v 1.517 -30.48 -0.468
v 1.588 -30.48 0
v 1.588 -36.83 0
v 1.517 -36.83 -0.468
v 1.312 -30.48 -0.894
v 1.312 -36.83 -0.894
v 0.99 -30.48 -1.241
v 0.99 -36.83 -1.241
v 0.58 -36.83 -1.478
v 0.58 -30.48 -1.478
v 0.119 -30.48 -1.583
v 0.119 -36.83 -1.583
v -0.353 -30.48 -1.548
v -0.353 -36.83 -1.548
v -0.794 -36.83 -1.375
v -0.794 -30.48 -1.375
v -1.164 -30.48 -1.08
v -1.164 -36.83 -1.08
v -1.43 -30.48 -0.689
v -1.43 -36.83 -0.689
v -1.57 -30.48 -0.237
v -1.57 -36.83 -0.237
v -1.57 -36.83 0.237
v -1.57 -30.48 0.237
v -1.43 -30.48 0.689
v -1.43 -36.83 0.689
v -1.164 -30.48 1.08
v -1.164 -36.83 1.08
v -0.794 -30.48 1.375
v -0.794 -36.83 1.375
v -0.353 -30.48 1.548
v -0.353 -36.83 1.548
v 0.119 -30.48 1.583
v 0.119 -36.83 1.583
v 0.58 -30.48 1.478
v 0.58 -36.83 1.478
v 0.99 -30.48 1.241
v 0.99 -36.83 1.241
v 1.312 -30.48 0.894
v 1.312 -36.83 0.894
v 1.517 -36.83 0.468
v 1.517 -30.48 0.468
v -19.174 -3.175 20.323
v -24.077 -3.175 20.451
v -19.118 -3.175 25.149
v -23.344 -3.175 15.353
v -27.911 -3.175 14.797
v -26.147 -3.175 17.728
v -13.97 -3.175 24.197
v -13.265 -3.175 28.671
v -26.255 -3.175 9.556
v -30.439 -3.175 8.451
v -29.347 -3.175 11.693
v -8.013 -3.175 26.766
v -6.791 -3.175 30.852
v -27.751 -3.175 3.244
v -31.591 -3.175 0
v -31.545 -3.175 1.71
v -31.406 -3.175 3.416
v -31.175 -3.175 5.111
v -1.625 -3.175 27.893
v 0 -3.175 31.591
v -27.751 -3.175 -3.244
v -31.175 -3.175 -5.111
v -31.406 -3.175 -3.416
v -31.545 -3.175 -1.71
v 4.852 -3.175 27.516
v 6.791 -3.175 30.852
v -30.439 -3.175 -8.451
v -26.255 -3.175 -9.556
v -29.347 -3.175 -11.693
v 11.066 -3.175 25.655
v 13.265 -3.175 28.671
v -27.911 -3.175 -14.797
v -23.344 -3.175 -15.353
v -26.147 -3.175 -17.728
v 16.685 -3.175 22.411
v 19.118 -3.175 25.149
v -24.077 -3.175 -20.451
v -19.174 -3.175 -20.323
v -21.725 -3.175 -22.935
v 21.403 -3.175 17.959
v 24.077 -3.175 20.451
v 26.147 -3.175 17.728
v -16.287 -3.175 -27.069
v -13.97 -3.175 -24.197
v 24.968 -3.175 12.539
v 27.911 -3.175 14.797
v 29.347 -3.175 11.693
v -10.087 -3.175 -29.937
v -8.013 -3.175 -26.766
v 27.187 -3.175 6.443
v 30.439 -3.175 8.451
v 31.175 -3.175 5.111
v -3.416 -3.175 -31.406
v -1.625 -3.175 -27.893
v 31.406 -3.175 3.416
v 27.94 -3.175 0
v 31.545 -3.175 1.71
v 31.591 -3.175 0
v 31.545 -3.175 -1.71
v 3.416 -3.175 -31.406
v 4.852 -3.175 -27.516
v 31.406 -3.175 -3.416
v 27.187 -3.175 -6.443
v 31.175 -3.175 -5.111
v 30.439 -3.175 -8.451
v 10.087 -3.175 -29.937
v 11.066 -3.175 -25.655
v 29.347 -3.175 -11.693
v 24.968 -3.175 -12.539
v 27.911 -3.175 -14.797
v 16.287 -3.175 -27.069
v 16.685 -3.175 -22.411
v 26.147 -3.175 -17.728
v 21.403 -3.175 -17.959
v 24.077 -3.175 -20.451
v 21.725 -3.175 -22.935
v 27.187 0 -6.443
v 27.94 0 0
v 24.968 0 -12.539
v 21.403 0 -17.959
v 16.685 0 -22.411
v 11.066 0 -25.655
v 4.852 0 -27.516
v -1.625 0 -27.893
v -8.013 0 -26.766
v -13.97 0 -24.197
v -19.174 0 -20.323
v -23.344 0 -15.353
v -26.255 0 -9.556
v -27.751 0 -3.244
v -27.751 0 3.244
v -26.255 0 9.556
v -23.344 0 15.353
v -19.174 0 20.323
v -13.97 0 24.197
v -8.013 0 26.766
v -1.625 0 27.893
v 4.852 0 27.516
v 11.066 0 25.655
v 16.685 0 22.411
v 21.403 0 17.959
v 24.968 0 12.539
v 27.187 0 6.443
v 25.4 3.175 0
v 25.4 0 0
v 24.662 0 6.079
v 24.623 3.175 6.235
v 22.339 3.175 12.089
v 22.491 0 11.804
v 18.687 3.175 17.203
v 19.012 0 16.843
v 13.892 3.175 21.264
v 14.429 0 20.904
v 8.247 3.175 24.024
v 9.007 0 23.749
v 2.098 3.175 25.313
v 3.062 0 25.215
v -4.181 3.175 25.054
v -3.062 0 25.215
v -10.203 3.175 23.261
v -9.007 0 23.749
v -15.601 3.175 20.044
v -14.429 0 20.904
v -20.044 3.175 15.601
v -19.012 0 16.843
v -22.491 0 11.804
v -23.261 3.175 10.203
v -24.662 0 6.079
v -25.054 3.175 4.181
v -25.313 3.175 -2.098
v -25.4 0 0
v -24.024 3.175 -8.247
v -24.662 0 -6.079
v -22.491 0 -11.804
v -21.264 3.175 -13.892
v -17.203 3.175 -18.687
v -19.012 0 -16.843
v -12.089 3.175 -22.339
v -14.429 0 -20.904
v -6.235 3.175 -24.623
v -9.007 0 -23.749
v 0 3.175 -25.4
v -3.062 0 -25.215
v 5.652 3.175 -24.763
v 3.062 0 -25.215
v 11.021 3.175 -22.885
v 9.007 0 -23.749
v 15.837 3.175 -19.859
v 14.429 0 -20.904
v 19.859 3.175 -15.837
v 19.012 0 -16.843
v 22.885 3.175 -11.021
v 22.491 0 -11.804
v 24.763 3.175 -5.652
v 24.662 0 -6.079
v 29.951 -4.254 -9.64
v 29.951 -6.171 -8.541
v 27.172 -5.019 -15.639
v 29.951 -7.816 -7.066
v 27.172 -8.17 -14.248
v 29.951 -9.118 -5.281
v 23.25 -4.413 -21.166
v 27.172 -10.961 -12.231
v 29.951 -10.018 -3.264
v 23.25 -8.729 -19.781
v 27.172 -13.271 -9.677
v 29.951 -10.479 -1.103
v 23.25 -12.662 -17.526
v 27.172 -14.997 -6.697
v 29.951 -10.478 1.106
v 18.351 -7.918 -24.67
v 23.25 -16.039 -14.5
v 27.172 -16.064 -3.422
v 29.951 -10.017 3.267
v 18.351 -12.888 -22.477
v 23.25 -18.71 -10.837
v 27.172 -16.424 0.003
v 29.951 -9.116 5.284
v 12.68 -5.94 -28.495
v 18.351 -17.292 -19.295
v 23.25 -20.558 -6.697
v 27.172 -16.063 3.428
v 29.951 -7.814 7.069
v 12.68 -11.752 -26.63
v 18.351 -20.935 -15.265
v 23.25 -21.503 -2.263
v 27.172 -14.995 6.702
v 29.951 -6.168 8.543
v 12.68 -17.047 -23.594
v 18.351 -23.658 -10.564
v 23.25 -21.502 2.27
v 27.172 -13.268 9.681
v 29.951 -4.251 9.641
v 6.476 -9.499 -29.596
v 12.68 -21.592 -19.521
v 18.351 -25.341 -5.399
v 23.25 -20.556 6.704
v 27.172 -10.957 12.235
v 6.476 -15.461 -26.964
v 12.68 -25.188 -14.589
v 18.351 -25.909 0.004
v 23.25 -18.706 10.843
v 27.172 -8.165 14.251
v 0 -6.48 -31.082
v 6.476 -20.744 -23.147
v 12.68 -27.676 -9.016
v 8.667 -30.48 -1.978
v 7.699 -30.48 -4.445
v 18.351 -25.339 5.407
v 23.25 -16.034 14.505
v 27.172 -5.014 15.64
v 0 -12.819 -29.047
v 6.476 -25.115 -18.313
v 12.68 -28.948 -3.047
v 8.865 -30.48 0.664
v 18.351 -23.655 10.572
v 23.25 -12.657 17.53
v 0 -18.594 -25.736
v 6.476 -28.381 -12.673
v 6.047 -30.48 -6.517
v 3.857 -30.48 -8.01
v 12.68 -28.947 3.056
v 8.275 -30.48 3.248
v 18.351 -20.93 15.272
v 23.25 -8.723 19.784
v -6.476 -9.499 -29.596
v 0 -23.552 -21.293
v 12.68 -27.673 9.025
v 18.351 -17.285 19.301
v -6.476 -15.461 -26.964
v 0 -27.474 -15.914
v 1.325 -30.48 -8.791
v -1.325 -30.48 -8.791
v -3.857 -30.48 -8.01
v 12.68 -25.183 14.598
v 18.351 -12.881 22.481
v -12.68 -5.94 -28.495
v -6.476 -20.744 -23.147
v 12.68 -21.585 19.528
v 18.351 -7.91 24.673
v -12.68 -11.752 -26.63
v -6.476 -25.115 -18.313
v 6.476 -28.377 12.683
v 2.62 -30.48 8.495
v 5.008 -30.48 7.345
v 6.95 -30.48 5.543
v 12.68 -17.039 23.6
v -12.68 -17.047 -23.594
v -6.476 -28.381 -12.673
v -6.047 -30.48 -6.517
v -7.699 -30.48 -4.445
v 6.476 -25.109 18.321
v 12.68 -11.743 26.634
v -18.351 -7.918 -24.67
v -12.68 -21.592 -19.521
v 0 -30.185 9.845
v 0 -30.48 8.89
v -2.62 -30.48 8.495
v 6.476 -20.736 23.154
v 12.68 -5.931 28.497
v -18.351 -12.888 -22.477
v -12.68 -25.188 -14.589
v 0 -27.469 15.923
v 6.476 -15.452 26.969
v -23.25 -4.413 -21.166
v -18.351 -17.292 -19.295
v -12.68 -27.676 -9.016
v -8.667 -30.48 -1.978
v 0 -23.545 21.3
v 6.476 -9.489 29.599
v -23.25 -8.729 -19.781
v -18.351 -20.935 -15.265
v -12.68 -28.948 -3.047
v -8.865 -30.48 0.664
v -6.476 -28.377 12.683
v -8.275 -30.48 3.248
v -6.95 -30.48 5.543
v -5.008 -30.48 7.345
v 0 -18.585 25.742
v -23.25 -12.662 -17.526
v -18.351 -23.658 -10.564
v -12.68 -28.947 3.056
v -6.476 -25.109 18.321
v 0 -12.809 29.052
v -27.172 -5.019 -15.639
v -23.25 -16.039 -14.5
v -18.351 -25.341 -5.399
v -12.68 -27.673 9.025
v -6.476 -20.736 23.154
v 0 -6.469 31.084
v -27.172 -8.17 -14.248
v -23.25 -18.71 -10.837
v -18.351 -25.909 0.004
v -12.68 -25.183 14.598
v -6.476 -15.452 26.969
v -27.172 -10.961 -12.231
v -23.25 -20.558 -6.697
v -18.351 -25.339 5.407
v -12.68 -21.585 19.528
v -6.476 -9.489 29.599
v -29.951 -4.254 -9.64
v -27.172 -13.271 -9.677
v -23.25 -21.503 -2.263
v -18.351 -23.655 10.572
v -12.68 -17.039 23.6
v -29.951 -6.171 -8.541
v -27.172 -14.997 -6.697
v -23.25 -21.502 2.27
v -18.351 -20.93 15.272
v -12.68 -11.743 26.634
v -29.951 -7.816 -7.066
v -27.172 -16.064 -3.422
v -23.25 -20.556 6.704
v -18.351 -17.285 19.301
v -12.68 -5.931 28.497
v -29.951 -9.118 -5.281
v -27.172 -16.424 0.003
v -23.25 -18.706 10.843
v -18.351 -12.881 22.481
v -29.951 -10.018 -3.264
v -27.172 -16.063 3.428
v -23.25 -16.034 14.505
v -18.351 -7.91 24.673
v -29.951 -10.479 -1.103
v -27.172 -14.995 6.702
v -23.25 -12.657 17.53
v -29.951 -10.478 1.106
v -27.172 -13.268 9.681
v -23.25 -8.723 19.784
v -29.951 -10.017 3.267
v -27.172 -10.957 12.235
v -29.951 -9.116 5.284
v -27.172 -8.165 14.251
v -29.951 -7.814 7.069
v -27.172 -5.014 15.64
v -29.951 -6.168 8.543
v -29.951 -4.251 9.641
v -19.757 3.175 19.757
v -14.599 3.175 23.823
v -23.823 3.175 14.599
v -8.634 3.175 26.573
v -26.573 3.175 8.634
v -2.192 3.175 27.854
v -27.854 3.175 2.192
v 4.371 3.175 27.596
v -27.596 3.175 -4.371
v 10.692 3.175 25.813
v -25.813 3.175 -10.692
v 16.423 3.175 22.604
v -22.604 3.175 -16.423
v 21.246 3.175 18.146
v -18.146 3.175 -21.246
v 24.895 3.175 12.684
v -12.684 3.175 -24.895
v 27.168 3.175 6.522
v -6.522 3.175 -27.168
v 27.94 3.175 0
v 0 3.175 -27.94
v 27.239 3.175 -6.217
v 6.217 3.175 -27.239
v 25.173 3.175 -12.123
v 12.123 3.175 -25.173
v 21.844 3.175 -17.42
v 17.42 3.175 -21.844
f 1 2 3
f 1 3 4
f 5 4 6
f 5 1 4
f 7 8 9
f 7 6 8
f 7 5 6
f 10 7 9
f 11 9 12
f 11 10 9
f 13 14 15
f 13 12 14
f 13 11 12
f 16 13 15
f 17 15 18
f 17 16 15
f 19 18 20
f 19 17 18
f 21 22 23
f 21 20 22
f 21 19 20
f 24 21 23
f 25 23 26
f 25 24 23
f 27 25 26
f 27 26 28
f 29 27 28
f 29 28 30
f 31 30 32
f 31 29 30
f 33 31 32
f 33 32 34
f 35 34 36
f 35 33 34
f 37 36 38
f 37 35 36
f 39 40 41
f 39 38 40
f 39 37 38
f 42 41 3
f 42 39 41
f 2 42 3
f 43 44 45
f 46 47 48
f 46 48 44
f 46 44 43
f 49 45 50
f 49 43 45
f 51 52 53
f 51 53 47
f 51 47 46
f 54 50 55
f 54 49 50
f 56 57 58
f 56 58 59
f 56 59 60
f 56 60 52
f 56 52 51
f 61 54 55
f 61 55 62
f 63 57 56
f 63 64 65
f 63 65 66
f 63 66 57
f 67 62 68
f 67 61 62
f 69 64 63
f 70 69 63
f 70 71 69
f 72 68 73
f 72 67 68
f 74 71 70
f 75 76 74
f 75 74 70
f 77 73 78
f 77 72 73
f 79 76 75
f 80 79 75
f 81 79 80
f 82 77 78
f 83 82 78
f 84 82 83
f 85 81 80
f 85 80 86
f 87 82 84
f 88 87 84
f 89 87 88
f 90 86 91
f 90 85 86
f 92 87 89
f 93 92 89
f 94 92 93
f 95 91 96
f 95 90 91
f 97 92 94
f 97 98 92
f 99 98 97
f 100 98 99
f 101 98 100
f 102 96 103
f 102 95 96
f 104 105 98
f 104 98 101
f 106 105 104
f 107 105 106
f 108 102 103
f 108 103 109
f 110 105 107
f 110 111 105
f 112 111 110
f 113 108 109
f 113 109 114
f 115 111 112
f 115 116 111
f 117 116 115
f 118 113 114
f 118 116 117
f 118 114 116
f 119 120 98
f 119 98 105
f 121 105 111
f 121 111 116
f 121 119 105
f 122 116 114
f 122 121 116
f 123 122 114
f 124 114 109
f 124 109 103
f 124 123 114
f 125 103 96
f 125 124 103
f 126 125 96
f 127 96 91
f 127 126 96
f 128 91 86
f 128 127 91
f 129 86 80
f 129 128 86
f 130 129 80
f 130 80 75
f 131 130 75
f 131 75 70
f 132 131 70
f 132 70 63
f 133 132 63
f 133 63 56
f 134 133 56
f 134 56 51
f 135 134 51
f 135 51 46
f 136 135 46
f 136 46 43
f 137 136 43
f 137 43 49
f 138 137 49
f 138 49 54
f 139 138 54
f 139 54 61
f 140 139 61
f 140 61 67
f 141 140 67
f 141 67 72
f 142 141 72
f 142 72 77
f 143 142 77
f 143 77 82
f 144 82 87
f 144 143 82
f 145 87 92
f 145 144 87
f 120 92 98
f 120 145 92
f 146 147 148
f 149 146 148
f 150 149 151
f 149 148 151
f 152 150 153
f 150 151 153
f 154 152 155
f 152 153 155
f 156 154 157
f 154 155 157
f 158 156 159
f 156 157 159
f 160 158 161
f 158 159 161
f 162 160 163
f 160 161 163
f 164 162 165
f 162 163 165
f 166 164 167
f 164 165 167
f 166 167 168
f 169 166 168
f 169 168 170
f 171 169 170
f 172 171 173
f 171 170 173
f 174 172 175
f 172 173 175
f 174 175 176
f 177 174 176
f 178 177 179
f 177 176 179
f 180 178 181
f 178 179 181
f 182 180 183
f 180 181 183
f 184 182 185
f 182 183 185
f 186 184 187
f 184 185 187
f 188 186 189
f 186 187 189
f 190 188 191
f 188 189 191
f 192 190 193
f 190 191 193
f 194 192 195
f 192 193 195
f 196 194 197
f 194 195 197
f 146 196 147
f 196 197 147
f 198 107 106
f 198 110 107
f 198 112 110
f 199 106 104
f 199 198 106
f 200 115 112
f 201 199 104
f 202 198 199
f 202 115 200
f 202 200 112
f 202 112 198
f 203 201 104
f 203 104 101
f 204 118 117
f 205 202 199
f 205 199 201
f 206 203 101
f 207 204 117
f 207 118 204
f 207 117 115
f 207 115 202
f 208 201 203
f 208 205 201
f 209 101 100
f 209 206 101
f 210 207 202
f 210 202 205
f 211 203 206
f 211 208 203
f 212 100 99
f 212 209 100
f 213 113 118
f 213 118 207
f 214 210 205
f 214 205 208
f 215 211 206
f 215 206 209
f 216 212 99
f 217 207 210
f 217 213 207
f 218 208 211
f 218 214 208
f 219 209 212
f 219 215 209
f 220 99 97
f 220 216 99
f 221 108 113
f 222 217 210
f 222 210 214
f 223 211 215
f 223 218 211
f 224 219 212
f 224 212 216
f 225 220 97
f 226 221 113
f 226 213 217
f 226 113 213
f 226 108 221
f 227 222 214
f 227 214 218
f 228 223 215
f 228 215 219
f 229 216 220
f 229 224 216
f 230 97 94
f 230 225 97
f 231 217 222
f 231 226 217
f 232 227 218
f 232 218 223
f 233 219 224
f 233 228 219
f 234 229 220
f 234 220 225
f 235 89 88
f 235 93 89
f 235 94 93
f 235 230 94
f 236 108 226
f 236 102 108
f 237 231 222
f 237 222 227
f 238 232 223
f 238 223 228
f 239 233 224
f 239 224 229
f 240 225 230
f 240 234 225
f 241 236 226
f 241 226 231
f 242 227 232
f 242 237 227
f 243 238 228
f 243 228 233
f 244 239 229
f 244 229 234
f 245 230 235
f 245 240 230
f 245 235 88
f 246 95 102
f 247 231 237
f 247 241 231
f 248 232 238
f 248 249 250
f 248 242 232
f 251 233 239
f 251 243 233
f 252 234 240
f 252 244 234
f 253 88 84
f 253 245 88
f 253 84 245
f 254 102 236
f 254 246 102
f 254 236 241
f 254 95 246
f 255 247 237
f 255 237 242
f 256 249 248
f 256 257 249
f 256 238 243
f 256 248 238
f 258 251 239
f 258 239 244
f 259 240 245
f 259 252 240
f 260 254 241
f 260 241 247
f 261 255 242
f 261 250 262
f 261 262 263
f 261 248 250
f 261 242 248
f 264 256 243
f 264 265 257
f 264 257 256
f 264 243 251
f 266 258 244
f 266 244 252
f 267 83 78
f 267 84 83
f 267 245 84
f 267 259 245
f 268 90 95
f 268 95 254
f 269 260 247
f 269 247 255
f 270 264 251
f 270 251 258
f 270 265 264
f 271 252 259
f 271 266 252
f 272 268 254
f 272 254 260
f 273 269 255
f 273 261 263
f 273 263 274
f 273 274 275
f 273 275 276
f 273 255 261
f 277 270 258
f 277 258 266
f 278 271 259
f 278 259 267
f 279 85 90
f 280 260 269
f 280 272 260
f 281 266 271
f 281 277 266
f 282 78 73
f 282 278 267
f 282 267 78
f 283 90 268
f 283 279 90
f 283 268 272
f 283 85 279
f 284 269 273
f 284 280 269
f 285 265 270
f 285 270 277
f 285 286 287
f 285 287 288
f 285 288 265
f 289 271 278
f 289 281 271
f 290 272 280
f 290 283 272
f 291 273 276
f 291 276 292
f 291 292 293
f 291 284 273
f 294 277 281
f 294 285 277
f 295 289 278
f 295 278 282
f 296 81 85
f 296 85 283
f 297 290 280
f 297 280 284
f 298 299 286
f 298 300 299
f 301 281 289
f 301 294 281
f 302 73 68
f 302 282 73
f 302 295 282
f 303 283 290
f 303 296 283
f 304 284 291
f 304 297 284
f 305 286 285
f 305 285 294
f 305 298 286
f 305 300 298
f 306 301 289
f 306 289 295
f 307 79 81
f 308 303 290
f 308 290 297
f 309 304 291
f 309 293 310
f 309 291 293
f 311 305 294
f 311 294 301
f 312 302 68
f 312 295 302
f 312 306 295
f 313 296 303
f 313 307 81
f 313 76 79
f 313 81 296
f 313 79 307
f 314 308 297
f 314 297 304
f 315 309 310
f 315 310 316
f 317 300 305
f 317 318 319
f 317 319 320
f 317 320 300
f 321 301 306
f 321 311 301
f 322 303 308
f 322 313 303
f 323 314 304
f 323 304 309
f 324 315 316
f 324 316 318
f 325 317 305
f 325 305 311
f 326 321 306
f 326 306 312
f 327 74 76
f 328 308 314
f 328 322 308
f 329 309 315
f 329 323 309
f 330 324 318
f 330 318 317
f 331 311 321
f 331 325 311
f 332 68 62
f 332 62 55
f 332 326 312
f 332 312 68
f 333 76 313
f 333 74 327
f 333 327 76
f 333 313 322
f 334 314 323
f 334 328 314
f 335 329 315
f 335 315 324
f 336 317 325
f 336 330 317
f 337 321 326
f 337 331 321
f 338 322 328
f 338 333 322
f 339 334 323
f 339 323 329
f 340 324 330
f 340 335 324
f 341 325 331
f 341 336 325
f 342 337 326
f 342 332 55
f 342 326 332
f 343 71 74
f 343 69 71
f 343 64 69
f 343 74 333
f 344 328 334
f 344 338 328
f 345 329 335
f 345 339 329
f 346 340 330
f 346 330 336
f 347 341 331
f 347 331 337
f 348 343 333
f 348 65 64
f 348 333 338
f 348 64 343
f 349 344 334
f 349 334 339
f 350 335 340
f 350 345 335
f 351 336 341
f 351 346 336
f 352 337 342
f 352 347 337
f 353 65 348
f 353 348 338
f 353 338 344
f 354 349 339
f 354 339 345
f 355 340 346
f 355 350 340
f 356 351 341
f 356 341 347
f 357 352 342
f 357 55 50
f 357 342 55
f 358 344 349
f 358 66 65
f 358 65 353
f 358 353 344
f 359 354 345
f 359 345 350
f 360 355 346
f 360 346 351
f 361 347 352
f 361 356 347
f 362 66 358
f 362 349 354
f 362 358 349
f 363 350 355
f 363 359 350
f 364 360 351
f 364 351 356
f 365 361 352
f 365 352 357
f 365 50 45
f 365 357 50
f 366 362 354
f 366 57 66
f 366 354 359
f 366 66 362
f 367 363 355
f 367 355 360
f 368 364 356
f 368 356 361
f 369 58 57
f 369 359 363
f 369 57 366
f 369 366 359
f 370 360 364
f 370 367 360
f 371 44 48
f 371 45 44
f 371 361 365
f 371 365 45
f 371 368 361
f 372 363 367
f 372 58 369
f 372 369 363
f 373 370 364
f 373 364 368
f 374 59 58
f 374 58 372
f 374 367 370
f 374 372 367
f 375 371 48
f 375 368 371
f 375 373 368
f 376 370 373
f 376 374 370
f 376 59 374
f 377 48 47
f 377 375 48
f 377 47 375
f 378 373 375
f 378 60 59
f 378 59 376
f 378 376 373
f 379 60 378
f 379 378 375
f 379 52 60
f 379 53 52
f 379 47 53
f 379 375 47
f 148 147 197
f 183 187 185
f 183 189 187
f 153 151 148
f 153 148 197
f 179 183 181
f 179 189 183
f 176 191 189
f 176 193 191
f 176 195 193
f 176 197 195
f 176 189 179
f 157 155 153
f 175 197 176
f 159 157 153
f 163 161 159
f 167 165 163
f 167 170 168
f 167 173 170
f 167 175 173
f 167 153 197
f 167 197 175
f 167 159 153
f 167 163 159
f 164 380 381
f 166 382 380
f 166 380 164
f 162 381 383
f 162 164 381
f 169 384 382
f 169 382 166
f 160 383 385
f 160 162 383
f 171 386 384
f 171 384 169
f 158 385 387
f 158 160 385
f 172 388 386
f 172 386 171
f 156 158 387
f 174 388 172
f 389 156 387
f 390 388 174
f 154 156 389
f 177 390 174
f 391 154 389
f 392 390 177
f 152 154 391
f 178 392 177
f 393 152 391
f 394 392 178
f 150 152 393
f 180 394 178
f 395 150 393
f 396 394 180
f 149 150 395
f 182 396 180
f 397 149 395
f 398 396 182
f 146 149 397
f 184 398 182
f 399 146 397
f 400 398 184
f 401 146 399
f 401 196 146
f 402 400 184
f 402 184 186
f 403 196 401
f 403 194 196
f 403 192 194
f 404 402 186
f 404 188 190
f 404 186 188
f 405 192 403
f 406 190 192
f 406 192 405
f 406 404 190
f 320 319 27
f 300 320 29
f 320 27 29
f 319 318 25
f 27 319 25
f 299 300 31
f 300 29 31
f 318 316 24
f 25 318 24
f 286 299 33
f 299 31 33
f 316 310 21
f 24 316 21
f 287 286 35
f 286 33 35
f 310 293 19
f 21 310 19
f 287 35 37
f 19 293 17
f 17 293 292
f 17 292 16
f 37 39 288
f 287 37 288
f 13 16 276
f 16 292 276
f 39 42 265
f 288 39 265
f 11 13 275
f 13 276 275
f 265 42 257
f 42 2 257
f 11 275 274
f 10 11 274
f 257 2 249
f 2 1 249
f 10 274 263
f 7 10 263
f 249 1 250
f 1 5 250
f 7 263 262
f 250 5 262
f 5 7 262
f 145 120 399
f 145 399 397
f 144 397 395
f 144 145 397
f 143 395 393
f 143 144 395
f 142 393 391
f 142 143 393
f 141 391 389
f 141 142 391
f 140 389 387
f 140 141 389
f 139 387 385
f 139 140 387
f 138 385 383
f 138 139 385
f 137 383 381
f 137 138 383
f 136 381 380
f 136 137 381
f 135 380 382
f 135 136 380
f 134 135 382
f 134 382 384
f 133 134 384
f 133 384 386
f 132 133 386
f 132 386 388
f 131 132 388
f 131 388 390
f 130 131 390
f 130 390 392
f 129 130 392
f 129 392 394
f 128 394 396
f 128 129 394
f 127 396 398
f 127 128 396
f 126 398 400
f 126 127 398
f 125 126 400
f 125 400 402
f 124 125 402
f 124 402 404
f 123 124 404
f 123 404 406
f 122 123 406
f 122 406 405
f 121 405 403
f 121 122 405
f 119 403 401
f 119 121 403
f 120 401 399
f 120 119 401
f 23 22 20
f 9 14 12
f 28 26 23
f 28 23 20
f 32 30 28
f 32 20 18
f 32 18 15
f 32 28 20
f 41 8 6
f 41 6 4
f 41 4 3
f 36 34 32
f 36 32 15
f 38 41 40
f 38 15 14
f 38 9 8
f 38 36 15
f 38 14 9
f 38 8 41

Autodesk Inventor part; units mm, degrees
ref_plane "YZ Plane" through (0, 0, 0) normal (1, 0, 0) x (0, 1, 0)
ref_plane "XZ Plane" through (0, 0, 0) normal (0, 1, 0) x (-1, 0, 0)
ref_plane "XY Plane" through (0, 0, 0) normal (0, 0, 1) x (1, 0, 0)
sketch "Sketch1" plane through (0, 0, 0) normal (0, 1, 0) x (-1, 0, 0)
  arc A0 (-31.75, 0) -> (31.75, 0) centre (0, 0) ccw
  line L0 (0, 0) -> (-31.75, 0) construction
  line L1 (0, 0) -> (31.75, 0) construction
  line L2 (31.75, 0) -> (-31.75, 0)
  dimension "d0" = 31.75
  dimension "d1" = 180
revolve "Revolution1" add sketch "Sketch1" angle 180 about axis through (-31.75, 0, 0) along (-1, 0, 0)
sketch "Sketch2" plane through (0, 0, 0) normal (0, 1, 0) x (1, 0, 0)
  line L0 (0, 0) -> (0, 27.94)
  line L1 (0, 27.94) -> (0, 0)
  line L2 (0, 0) -> (0, 25.4)
  circle A0 centre (0, 0) radius 27.94
  circle A1 centre (0, 0) radius 25.4
  dimension "d3" = 27.94
  dimension "d4" = 25.4
extrude "Extrusion1" add sketch "Sketch2" along normal blind 3.175
sketch "Sketch3" plane through (0, 0, 0) normal (0, 1, 0) x (1, 0, 0)
  circle A0 centre (0, 0) radius 27.94
  circle A1 centre (0, 0) radius 31.75
extrude "Extrusion2" cut sketch "Sketch3" against normal blind 3.175
sketch "Sketch4" plane through (0, 0, 0) normal (0, 1, 0) x (1, 0, 0)
  circle A0 centre (0, 0) radius 31.75
  dimension "d9" = 63.5
extrude "Extrusion3" cut sketch "Sketch4" along normal blind 50.8 and the other way blind 30.48 keep common part
sketch "Sketch5" plane through (0, -30.48, 0) normal (0, -1, 0) x (1, 0, 0)
  circle A0 centre (0, 0) radius 1.5875
  dimension "d14" = 3.175
extrude "Extrusion4" add sketch "Sketch5" along normal blind 6.35
properties part number "mid ball bottom"
